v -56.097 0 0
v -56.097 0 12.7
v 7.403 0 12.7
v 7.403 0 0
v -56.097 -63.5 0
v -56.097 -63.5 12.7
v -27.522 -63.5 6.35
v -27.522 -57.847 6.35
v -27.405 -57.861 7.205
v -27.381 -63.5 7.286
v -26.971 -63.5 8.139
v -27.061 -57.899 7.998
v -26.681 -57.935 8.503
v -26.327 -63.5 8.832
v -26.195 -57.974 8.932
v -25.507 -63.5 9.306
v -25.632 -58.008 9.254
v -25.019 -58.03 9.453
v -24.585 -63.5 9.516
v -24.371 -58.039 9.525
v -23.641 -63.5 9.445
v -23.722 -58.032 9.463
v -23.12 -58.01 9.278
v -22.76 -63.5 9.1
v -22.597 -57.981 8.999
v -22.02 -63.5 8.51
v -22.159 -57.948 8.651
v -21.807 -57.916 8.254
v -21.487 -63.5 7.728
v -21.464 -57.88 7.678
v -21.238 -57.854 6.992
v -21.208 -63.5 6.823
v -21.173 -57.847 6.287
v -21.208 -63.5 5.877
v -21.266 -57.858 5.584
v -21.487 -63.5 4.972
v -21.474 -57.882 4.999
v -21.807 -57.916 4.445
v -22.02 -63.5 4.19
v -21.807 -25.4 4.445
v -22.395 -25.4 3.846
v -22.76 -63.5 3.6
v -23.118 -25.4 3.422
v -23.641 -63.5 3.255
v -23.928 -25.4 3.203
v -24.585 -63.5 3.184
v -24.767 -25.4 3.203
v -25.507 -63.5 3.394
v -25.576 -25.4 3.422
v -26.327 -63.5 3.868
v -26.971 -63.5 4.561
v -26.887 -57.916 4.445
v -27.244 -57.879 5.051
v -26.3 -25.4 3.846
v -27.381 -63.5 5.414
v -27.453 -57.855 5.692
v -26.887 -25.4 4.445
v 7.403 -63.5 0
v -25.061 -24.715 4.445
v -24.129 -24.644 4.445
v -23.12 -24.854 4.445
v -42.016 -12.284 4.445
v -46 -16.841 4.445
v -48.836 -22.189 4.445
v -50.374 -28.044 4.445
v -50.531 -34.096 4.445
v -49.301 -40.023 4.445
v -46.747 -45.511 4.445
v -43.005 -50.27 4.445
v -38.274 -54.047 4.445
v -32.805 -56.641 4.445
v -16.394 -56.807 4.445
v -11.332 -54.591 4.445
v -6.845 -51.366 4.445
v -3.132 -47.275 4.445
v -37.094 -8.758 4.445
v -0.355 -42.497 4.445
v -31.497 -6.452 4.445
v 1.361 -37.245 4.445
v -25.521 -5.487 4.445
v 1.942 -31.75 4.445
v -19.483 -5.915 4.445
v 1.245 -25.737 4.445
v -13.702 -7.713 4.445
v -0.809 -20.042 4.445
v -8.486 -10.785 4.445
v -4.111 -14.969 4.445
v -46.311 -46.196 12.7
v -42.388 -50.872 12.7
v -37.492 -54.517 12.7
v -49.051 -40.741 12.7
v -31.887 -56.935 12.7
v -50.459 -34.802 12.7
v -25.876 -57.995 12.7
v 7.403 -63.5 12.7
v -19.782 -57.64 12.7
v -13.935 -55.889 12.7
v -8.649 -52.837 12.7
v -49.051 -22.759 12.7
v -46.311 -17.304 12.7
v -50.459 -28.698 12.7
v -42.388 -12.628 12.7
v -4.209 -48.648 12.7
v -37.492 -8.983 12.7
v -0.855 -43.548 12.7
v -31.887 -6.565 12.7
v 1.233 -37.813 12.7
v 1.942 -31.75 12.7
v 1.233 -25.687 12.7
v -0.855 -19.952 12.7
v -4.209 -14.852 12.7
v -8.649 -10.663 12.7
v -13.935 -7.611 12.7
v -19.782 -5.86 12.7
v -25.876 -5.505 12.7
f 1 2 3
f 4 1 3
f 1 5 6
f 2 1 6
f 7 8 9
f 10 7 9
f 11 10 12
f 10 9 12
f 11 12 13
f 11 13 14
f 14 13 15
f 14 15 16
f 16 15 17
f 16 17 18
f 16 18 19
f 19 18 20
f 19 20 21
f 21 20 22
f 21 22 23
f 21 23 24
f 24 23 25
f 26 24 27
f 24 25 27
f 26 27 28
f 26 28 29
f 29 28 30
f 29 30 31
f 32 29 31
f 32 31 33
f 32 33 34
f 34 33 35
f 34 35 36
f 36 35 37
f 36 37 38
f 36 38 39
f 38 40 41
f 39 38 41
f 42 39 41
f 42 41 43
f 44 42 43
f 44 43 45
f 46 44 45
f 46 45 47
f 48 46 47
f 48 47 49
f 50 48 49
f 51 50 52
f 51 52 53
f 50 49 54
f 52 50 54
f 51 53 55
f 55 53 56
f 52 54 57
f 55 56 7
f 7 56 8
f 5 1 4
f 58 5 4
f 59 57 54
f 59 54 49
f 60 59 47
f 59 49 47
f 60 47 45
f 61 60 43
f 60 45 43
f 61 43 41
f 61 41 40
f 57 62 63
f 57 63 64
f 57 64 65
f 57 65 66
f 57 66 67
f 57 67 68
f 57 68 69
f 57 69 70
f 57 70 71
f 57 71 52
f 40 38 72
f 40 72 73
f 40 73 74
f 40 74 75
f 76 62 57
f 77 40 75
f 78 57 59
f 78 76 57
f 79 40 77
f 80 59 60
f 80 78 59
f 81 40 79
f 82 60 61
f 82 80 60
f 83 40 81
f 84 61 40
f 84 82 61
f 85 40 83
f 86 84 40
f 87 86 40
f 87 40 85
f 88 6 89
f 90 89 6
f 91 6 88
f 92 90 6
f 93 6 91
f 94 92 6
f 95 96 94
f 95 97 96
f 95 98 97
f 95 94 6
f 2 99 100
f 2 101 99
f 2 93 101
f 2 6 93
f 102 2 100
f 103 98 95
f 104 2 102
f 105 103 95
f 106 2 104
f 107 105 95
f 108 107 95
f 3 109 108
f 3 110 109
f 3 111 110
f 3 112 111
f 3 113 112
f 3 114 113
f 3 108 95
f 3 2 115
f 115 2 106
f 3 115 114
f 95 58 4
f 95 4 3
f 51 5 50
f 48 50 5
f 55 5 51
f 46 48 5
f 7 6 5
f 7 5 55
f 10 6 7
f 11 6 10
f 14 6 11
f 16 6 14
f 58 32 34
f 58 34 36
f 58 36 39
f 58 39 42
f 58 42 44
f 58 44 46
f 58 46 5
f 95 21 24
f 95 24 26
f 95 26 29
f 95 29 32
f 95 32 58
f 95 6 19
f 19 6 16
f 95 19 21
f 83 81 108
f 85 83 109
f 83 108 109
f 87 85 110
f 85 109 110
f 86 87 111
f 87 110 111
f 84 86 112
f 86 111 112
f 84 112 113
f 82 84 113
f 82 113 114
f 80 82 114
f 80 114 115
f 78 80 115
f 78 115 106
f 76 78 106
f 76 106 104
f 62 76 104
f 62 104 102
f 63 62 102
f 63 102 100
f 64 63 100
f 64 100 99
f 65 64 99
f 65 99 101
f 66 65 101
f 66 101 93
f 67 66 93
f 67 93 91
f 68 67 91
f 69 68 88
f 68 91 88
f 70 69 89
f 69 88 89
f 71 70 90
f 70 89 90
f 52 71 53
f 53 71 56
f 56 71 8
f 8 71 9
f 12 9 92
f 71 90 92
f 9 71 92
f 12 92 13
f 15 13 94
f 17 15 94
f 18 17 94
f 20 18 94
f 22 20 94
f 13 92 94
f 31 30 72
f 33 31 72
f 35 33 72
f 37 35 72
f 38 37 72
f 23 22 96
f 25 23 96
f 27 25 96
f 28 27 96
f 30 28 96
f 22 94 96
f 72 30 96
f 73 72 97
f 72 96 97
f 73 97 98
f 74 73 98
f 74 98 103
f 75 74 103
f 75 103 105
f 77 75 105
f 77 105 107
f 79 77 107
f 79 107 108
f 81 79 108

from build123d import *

# Parameters (mm, degrees)
F0_W     = 63.5
F0_H     = 12.7
F1_DEPTH = 63.5
F2_R     = 26.289
F3_DEPTH = 8.255
F5_D     = 6.35
F5_DEPTH = 38.1
F5_TIP   = 1.9077324654


with BuildPart() as f1:
    # F0 (on Front) → F1 (new body)
    with BuildSketch(Plane.XZ):
        with Locations((-24.3473223271, 6.35)):
            Rectangle(F0_W, F0_H)
    extrude(amount=F1_DEPTH)

    # F2 (on face) → F3 (cut)
    with BuildSketch(Plane.XY.offset(12.7)):
        with Locations((-24.3473223271, -31.75)):
            Circle(F2_R)
    extrude(amount=-F3_DEPTH, mode=Mode.SUBTRACT)

    # F5
    with Locations(Plane.XZ.offset(63.5)):
        with Locations((-24.3473223271, 6.35)):
            Hole(F5_D / 2, depth=F5_DEPTH)
            with Locations((0, 0, -(F5_DEPTH + F5_TIP / 2))):  # 118° drill point
                Cone(0, F5_D / 2, F5_TIP, mode=Mode.SUBTRACT)


solid = f1.part
